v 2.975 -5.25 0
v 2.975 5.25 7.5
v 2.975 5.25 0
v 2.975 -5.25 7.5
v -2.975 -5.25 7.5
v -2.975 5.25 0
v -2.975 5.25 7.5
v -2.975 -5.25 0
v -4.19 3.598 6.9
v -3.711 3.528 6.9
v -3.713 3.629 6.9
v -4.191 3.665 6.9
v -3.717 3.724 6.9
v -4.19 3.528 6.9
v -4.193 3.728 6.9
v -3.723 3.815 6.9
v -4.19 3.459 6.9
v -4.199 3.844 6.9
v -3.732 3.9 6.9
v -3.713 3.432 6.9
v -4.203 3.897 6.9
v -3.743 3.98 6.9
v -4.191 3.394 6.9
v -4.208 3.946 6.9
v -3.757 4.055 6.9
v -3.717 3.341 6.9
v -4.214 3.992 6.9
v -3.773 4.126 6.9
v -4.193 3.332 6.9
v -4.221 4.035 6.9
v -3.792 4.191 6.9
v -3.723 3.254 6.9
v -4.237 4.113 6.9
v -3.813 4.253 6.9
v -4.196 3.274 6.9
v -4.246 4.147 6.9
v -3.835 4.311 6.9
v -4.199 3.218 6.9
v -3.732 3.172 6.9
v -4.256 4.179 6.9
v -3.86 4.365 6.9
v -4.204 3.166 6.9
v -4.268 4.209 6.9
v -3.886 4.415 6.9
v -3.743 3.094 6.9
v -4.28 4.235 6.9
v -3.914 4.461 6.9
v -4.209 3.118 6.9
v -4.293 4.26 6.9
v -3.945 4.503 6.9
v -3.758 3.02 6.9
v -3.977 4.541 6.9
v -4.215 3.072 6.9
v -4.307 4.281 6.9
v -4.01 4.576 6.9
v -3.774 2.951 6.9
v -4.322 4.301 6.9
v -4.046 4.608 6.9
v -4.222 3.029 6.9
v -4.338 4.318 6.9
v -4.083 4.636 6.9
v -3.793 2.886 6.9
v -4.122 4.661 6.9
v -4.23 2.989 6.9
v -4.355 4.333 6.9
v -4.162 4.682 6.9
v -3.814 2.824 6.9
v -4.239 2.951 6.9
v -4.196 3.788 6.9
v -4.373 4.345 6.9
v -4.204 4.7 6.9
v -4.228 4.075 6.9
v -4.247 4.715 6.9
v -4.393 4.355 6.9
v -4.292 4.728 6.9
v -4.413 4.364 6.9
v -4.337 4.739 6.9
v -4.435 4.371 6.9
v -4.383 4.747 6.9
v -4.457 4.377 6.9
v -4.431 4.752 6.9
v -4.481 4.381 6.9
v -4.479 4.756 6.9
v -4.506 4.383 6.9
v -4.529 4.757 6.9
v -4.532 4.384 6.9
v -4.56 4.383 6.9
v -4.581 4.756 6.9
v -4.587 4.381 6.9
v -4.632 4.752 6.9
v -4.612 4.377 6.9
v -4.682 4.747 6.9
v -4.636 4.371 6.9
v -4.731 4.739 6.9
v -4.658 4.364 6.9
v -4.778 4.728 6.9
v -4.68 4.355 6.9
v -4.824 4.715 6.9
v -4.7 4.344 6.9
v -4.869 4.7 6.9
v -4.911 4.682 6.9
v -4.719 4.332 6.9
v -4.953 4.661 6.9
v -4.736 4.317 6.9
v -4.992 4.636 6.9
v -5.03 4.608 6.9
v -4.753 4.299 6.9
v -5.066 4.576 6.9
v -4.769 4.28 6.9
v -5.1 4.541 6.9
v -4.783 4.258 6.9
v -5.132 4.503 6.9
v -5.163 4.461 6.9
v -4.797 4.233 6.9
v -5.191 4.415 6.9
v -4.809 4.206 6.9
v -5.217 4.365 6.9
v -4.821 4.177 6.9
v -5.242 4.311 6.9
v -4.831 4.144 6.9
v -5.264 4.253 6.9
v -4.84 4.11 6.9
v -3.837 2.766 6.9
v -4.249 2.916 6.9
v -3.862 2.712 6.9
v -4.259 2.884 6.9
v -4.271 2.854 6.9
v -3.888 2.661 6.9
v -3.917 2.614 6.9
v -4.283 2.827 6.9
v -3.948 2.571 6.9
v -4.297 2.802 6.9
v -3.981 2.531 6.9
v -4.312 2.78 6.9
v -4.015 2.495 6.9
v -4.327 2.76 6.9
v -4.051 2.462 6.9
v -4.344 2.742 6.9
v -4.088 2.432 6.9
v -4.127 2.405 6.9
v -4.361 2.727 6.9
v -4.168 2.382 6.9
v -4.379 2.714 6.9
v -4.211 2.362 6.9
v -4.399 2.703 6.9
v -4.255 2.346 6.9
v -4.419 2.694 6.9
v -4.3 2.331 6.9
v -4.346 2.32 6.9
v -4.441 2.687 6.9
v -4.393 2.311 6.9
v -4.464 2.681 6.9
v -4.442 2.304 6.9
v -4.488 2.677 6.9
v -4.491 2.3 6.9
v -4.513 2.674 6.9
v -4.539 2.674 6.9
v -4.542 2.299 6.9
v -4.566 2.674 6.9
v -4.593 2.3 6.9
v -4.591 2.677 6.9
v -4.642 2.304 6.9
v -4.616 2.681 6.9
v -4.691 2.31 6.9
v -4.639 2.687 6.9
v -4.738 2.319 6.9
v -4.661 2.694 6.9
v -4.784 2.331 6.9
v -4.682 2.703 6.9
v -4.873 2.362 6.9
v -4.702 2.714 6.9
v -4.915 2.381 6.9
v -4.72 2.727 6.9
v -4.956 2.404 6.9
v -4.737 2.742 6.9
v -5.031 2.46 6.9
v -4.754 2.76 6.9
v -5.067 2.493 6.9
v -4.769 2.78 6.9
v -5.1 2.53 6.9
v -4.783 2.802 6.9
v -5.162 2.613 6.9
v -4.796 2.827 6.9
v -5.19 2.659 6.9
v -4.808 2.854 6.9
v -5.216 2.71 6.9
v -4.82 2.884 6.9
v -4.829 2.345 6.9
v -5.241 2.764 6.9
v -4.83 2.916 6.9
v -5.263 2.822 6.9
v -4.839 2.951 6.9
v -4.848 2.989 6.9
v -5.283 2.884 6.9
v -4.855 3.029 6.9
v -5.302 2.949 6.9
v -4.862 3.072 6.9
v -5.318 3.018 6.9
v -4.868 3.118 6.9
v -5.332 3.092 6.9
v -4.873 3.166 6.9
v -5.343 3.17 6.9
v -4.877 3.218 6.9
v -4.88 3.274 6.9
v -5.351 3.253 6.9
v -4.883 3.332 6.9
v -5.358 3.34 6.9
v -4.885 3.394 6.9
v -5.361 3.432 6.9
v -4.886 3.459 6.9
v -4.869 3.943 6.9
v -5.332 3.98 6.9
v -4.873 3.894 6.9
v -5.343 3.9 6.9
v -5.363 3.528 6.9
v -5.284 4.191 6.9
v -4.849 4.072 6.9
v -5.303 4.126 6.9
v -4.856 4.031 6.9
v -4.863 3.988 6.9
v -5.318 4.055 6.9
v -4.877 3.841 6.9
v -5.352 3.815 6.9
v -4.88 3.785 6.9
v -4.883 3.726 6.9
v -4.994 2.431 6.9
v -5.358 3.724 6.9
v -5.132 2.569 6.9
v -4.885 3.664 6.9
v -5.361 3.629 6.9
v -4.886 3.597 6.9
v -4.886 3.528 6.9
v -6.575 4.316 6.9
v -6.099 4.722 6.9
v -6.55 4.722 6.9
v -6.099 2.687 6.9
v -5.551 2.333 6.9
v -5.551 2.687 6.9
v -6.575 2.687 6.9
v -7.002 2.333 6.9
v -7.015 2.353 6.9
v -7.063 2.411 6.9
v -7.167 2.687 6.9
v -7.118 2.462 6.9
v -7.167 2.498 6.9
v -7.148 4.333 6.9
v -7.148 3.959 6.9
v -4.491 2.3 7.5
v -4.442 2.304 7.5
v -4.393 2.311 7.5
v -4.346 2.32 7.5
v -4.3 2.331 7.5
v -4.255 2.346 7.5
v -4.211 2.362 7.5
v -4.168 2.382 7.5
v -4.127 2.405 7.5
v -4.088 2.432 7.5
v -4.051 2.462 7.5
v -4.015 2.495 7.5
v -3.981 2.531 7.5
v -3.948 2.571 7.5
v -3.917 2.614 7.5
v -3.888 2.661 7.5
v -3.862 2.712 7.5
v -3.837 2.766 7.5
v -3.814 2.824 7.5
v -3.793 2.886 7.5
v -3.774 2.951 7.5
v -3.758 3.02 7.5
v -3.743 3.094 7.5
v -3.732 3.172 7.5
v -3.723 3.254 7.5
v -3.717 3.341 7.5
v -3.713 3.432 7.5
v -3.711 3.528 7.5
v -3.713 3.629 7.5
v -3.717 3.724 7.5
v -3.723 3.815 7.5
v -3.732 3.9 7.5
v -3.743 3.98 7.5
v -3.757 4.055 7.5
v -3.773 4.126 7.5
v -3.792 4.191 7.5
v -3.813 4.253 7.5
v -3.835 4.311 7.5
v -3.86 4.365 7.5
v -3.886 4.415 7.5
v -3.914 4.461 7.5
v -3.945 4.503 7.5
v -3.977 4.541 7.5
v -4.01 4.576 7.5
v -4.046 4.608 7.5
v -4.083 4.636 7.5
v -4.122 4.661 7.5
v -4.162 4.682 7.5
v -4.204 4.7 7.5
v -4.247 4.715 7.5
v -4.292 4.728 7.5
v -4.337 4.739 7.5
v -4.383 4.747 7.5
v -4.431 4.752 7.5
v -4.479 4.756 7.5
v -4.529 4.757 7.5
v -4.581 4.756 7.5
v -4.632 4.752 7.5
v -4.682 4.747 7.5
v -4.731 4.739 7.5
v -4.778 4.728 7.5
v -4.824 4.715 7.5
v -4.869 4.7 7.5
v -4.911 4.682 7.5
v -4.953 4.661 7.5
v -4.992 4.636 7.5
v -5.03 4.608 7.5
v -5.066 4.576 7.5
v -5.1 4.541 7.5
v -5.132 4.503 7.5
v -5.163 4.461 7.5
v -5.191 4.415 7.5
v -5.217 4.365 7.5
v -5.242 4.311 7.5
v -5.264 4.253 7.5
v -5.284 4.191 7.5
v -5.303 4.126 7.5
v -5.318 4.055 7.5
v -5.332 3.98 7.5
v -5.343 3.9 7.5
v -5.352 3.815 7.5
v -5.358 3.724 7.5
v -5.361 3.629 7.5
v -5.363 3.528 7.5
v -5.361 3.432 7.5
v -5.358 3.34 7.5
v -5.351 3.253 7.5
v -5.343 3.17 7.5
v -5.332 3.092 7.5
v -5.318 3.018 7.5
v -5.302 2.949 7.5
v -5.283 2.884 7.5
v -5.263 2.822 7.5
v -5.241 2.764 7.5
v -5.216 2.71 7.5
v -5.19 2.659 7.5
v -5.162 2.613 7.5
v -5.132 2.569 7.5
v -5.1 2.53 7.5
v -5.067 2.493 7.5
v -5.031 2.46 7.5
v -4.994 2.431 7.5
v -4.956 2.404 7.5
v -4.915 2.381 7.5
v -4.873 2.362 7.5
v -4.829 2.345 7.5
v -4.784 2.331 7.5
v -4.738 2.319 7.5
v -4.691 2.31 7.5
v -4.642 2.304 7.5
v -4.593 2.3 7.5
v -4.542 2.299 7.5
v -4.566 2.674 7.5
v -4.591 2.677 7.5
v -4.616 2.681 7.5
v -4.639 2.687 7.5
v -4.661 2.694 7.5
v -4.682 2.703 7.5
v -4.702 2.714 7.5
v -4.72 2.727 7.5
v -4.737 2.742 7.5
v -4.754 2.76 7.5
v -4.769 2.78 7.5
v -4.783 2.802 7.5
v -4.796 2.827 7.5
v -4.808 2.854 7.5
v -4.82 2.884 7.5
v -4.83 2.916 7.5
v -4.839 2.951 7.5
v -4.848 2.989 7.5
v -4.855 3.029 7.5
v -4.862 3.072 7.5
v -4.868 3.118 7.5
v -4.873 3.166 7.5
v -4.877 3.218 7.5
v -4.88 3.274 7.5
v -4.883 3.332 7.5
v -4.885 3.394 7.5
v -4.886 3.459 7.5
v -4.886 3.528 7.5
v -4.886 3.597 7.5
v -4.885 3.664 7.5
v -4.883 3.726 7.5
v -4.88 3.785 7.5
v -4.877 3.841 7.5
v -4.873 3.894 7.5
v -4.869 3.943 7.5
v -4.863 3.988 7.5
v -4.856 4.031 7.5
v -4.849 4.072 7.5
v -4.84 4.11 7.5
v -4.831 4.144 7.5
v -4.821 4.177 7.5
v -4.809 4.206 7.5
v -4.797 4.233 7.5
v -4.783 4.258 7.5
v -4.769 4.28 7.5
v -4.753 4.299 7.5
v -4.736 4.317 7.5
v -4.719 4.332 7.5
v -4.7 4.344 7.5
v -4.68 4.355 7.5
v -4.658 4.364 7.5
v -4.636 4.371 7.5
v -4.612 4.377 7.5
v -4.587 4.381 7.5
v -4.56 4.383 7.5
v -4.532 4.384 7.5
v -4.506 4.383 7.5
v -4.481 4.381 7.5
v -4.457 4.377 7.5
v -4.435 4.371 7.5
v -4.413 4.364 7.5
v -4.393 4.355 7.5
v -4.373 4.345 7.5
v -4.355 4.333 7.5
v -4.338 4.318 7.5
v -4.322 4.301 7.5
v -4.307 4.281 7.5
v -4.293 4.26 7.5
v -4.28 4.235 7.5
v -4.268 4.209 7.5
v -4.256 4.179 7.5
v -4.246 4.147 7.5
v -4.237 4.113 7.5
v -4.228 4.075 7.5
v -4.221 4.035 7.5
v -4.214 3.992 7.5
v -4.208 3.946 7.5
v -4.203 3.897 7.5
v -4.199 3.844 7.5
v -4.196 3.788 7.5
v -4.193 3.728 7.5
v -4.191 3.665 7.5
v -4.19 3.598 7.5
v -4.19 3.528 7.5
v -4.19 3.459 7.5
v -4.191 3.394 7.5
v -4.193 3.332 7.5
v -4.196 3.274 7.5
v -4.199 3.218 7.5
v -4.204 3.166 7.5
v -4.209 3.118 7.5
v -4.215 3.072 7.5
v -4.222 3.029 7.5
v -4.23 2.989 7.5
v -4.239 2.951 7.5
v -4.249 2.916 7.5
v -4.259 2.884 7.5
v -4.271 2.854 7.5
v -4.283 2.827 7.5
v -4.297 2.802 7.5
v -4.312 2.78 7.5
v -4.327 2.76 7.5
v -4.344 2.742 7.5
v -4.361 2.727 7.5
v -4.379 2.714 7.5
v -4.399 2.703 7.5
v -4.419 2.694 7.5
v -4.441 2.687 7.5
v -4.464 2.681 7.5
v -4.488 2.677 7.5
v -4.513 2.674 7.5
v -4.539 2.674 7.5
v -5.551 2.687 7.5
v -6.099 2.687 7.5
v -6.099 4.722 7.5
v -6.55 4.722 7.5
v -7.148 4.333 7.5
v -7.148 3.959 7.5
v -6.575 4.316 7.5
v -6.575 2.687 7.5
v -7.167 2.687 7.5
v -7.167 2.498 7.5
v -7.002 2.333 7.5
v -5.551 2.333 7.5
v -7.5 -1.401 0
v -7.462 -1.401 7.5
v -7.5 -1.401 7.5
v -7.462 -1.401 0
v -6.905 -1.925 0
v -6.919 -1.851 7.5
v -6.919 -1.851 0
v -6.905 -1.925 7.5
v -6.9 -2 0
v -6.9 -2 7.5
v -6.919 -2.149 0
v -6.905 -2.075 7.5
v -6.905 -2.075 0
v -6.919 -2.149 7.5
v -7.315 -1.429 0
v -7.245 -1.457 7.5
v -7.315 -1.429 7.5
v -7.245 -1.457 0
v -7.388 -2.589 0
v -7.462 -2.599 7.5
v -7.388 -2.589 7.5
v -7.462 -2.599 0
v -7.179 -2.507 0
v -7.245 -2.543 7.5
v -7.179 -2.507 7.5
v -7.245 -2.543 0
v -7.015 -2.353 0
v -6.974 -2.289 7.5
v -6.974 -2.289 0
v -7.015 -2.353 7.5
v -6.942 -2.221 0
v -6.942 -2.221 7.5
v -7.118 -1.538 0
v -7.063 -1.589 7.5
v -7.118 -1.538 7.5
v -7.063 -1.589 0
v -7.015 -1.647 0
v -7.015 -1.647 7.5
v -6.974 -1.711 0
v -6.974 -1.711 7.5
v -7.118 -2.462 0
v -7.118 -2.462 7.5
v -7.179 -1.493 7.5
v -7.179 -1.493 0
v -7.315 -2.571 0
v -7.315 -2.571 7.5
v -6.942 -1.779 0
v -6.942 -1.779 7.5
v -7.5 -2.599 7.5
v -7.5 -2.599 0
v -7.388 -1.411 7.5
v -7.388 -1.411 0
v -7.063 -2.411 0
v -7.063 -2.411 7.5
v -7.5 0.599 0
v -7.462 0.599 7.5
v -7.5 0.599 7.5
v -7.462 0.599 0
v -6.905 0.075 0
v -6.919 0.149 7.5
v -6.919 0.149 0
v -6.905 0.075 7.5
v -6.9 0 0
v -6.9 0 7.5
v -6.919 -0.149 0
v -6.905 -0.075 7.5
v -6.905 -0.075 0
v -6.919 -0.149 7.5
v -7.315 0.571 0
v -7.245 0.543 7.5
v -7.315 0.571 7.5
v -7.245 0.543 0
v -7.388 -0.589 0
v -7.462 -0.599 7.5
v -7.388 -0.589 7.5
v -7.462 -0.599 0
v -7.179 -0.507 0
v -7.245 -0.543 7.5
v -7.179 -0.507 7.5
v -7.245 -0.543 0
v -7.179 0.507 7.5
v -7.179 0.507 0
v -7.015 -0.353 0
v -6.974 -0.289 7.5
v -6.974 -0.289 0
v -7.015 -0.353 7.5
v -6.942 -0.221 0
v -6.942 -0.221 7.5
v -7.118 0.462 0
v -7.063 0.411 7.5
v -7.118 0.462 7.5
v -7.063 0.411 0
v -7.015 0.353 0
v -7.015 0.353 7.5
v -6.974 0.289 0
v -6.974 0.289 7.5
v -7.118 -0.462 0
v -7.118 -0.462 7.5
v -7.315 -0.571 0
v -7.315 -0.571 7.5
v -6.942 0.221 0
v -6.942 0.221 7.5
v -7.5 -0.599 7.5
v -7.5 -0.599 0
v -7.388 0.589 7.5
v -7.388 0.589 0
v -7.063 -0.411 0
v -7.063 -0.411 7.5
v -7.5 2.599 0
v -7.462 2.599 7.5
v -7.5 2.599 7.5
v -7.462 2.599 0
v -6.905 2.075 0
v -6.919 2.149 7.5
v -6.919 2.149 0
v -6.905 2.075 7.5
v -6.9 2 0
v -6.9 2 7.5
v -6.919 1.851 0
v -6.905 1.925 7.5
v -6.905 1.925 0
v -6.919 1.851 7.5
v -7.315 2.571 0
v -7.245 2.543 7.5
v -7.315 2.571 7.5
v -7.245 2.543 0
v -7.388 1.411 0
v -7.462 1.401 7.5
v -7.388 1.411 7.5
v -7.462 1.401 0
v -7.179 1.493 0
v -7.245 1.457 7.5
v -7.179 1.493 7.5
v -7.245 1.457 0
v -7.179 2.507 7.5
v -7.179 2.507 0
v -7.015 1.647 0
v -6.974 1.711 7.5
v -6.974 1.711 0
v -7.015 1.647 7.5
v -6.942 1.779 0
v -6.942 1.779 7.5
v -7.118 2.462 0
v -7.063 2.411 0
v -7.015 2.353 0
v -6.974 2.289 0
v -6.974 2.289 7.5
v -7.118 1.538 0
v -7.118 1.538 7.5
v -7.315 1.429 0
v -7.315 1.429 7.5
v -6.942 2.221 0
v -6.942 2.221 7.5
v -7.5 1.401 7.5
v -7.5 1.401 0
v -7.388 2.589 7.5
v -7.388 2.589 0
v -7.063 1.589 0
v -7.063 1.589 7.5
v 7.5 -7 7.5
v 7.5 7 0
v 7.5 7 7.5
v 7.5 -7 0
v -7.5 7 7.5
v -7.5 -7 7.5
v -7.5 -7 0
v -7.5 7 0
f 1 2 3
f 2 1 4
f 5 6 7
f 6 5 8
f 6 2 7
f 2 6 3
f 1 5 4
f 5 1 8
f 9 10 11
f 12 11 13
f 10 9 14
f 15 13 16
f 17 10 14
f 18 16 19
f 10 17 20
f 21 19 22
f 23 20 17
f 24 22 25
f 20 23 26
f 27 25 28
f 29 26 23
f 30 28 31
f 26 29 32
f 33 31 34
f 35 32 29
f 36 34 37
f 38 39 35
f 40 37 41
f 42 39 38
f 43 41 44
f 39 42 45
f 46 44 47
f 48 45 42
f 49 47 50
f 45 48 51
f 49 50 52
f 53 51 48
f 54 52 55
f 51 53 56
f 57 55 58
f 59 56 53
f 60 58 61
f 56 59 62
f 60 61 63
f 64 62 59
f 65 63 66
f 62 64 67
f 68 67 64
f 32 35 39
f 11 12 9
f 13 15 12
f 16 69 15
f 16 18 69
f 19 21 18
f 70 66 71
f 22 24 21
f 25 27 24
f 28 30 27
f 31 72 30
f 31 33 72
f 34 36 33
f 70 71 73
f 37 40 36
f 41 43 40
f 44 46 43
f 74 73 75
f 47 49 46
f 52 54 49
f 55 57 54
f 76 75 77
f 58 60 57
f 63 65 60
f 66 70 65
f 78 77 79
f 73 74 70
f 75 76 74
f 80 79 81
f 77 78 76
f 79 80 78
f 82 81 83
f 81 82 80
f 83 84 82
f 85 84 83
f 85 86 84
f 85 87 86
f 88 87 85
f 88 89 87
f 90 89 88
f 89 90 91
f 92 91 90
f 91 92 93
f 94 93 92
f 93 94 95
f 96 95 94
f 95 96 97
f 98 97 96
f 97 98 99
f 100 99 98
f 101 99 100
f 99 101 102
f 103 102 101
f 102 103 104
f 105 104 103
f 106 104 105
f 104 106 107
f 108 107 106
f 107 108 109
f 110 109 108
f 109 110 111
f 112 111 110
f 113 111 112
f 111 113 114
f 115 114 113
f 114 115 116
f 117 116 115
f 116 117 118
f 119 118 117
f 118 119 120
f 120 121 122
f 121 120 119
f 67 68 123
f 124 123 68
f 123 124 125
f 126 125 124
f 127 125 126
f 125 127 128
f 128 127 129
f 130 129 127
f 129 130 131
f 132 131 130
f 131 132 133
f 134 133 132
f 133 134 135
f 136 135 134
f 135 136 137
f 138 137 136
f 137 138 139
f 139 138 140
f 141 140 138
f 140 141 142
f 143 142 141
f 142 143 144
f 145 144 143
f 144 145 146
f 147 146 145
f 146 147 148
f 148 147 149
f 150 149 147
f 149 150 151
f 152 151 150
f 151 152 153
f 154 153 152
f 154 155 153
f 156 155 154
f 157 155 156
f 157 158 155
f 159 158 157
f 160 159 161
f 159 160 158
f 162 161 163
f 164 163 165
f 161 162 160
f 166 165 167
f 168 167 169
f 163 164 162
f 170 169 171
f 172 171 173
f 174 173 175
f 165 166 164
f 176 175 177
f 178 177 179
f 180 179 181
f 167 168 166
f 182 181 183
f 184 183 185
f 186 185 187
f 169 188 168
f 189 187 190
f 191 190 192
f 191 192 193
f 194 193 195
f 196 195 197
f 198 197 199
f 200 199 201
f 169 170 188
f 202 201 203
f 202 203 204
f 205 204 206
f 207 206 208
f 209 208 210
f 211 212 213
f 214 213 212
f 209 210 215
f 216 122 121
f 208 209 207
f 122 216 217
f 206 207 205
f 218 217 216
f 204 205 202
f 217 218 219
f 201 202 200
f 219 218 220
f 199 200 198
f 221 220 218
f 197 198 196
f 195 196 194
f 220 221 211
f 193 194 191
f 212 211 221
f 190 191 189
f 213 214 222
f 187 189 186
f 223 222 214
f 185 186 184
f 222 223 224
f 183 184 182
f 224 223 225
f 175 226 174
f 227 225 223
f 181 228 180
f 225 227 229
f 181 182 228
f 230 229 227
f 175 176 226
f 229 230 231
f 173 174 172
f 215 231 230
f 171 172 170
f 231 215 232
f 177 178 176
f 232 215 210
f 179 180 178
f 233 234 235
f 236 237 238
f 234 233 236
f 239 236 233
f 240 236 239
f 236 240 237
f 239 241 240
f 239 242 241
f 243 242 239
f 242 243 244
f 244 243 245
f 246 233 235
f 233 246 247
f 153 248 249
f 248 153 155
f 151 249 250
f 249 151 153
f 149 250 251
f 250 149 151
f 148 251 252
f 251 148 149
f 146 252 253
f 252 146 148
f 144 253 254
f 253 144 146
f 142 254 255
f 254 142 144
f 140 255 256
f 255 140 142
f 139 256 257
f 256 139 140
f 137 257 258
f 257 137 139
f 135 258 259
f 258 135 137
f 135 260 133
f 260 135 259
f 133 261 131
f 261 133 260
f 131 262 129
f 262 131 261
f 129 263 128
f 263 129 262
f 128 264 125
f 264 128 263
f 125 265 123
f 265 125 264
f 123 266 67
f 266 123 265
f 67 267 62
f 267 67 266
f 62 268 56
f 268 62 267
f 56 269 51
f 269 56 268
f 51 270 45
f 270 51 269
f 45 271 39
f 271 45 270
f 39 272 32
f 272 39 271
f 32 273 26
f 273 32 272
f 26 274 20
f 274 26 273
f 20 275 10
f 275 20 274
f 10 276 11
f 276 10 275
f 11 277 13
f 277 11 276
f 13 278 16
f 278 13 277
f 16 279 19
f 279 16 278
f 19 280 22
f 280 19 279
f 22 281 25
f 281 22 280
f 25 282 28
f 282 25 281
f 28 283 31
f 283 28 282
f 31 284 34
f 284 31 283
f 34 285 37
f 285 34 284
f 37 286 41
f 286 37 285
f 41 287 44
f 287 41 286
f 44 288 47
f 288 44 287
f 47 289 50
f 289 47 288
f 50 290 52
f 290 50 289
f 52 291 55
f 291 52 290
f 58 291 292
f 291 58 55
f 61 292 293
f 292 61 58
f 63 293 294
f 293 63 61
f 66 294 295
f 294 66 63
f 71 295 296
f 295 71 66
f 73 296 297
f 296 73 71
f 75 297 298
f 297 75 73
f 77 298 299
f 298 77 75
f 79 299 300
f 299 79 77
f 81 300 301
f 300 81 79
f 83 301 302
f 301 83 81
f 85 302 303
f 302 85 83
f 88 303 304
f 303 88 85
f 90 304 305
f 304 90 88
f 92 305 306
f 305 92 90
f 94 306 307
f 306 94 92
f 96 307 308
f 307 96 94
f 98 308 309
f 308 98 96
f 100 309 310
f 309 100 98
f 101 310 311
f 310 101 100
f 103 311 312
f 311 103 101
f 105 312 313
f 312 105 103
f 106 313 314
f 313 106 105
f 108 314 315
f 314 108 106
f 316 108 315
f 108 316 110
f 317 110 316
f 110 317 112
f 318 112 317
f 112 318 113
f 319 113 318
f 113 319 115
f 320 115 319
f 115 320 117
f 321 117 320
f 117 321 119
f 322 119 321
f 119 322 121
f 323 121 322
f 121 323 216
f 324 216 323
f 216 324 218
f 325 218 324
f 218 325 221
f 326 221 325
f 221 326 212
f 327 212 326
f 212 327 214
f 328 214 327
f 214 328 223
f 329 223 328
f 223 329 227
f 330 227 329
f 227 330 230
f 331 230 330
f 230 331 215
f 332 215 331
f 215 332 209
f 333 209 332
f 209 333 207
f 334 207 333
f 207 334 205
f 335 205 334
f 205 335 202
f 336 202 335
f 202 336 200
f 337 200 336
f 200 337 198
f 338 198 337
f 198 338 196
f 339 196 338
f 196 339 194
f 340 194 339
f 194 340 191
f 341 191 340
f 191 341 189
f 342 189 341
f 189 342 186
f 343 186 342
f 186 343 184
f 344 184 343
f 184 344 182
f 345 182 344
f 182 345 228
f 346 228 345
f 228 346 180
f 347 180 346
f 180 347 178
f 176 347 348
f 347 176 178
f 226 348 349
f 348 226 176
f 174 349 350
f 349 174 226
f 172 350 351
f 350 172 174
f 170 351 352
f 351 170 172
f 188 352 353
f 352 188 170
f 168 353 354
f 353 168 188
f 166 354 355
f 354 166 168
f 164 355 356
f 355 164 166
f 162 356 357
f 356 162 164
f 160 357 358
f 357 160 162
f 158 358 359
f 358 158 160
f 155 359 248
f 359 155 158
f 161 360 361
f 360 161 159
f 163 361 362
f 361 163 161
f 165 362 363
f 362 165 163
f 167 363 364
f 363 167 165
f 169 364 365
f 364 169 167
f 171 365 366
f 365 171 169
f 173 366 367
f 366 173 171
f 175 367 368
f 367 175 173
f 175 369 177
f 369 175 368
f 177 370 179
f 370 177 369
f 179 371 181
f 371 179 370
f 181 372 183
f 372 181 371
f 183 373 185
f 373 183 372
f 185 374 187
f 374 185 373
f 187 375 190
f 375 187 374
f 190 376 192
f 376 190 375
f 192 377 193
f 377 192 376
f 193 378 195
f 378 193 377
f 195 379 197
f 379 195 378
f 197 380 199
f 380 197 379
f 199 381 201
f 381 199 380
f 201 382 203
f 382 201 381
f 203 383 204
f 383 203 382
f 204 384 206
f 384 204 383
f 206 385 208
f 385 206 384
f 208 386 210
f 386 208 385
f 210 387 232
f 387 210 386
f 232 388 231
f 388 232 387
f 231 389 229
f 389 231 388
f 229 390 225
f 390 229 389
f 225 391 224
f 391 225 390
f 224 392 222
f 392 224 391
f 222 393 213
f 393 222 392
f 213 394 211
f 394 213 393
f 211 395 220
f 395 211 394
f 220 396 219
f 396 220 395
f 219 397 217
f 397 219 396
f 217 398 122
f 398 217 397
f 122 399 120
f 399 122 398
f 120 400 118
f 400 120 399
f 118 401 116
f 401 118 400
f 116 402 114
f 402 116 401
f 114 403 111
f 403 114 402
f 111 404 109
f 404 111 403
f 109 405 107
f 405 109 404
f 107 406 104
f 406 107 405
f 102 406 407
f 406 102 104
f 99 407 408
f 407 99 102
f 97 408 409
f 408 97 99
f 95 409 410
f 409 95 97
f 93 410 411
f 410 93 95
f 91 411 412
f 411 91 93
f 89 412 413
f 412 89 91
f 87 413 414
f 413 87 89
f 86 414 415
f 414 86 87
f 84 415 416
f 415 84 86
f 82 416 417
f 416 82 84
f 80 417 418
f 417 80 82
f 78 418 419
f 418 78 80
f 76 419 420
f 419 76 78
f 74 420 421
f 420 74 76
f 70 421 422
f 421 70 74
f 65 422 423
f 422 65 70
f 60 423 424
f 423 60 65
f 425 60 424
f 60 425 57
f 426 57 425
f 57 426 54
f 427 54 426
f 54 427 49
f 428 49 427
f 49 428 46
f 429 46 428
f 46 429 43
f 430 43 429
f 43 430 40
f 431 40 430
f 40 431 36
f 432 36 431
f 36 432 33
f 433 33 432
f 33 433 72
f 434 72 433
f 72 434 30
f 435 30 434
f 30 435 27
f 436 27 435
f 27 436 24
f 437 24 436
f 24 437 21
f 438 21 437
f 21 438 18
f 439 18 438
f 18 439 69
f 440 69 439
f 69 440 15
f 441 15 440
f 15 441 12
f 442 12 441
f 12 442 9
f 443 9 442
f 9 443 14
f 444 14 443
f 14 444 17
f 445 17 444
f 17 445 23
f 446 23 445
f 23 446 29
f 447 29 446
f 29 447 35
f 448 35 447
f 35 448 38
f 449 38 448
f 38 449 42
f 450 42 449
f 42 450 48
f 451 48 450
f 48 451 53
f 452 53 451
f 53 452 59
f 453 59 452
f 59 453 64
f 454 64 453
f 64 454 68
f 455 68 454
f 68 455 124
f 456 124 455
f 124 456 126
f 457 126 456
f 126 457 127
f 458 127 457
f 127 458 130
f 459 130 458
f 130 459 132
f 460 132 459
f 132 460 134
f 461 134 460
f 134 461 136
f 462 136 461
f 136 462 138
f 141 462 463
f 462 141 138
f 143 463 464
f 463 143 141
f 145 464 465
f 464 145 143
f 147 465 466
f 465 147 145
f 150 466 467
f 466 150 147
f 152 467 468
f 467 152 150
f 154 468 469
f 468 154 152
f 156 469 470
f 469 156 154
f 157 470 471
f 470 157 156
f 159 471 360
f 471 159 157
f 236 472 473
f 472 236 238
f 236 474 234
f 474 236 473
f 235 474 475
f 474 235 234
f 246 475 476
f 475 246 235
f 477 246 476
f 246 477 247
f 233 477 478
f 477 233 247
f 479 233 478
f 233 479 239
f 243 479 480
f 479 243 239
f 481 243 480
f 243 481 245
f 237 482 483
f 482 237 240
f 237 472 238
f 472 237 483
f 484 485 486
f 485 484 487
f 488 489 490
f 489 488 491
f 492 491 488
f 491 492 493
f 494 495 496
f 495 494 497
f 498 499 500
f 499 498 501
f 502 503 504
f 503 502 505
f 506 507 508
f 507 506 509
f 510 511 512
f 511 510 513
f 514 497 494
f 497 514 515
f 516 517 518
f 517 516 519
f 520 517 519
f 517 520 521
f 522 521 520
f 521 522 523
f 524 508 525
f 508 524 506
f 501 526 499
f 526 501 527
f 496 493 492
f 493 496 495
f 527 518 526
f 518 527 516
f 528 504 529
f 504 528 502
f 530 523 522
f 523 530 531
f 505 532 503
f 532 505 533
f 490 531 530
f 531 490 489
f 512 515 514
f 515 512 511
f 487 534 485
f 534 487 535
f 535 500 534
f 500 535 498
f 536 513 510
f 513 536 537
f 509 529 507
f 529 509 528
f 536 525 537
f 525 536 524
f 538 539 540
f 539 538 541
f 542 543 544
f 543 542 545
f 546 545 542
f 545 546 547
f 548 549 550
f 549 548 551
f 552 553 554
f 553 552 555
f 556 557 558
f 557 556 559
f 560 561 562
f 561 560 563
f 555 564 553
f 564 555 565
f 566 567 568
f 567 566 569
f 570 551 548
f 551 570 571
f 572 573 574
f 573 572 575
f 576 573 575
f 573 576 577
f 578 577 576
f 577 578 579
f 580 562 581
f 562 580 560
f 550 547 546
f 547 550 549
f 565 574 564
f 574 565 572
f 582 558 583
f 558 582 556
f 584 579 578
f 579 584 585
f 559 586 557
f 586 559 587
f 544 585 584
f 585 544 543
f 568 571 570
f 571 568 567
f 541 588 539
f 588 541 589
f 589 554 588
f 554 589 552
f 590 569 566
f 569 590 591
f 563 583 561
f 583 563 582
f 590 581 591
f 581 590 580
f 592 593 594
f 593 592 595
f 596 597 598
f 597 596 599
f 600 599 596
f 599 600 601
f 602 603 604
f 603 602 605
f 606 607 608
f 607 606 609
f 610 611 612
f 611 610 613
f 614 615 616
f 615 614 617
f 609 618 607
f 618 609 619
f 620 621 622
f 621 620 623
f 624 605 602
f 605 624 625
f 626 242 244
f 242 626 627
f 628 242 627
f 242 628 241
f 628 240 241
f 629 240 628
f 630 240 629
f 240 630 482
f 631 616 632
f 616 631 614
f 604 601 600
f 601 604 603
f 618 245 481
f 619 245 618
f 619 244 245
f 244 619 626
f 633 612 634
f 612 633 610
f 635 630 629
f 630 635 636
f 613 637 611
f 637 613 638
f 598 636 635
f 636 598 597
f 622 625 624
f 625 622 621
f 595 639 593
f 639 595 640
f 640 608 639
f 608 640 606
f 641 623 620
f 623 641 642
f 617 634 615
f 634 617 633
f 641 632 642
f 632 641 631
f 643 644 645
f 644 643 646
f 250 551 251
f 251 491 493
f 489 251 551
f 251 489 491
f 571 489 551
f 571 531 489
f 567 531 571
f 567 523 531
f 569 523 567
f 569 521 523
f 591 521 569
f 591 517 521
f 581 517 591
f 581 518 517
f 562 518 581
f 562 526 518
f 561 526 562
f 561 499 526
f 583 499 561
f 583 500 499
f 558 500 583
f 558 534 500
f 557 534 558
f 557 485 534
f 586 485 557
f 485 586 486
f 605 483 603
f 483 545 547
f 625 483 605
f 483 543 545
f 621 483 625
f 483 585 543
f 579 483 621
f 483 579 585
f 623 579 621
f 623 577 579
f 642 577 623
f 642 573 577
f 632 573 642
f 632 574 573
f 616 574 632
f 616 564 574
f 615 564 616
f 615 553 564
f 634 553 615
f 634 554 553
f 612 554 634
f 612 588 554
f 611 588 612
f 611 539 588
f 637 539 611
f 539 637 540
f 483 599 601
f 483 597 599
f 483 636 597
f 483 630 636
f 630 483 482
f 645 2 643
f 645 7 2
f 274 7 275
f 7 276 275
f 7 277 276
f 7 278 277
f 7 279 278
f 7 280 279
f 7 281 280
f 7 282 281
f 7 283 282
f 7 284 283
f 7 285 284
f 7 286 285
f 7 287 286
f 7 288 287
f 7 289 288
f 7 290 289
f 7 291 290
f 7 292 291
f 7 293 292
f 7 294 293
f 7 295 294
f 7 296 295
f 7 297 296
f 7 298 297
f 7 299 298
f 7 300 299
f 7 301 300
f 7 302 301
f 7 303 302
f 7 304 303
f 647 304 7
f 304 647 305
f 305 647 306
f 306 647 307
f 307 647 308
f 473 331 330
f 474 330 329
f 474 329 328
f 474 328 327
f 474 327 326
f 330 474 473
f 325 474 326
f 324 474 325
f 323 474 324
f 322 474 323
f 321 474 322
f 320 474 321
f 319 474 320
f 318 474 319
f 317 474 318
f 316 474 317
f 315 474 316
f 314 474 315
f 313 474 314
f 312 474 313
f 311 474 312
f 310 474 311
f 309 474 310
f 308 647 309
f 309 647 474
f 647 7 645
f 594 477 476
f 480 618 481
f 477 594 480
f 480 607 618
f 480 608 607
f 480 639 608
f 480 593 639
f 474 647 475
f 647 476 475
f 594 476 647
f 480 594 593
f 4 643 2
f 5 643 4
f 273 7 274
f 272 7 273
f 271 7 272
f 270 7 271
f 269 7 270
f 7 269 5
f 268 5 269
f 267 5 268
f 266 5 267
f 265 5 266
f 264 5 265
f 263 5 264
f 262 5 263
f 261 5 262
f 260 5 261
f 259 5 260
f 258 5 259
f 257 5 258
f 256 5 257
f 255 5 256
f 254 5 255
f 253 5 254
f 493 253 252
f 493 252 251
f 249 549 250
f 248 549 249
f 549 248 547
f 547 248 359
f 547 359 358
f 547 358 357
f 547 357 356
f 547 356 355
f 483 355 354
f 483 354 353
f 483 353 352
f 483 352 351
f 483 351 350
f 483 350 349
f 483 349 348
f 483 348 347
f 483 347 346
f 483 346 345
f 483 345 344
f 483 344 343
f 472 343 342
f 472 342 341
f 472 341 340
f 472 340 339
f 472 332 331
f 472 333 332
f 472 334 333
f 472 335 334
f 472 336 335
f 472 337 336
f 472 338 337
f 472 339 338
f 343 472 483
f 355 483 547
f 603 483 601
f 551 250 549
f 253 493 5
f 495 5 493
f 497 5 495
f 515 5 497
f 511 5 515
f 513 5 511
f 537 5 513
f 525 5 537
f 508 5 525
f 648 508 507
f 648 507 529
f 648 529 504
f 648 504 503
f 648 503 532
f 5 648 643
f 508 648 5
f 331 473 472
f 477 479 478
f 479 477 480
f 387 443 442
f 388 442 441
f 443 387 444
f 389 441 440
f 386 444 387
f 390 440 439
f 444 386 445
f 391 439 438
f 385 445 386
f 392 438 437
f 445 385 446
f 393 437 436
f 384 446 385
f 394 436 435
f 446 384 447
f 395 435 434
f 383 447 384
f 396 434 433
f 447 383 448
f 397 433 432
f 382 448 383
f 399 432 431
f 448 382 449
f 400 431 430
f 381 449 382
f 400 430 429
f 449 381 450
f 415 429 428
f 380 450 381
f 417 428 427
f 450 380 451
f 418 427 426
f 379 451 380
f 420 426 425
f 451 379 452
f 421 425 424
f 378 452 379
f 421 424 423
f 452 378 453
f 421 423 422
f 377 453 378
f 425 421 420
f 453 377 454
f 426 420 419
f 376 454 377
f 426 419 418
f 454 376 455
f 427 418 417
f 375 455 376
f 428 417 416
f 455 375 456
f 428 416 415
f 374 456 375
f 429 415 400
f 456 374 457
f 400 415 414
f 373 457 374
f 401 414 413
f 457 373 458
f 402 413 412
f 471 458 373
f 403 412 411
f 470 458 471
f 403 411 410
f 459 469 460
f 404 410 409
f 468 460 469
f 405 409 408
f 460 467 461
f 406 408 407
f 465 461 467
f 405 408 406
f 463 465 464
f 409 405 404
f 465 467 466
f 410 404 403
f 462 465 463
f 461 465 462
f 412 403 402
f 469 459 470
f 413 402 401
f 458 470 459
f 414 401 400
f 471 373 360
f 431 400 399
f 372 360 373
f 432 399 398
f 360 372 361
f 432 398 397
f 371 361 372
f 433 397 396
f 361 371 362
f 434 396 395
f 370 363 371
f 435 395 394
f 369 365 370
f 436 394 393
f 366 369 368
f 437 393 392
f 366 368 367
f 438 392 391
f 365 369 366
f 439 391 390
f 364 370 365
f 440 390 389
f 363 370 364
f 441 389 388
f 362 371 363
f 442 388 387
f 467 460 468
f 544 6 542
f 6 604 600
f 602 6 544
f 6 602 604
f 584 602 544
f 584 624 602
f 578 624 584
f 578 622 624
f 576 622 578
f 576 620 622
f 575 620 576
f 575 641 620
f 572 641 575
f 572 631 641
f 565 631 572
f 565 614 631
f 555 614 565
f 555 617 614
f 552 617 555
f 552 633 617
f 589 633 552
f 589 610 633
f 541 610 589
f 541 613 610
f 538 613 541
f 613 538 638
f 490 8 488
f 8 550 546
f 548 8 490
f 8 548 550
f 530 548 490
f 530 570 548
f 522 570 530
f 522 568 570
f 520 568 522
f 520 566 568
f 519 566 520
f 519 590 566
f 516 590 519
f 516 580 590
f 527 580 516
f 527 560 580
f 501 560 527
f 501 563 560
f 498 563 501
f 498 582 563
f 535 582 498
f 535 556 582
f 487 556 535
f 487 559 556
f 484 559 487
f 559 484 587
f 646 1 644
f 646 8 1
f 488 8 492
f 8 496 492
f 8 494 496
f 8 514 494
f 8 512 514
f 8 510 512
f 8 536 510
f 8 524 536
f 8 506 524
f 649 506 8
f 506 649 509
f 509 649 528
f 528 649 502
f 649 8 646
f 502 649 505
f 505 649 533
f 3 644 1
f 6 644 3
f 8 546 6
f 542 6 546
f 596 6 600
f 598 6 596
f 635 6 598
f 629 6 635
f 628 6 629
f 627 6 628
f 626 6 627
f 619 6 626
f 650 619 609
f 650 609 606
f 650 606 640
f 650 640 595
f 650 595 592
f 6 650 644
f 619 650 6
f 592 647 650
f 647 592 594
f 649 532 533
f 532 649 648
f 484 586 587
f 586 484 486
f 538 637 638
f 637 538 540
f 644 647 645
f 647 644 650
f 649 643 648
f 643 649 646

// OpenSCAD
$fn = 50;

difference() {
	union() {
		translate(v = [0, -5, 0]) {
			rotate(a = [0, 0, 0]) {
				difference() {
					union() {
						translate(v = [-7.5, -2.0, 0]) {
							cube(size = [15.0, 14.0, 7.5]);
						}
					}
					union() {
						translate(v = [-2.975, -0.25, -0.1]) {
							cube(size = [5.95, 10.5, 7.7]);
						}
						translate(v = [-5.5, 8.5, 6.9]) {
							linear_extrude(height = 0.7) {
								text(font = "Arial:style=Bold", halign = "center", size = 2.5, text = "10", valign = "center");
							}
						}
						translate(v = [-7.5, 3, -0.1]) {
							cylinder(h = 7.7, r = 0.6);
						}
						translate(v = [-7.5, 5, -0.1]) {
							cylinder(h = 7.7, r = 0.6);
						}
						translate(v = [-7.5, 7, -0.1]) {
							cylinder(h = 7.7, r = 0.6);
						}
					}
				}
			}
		}
	}
	union();
}
